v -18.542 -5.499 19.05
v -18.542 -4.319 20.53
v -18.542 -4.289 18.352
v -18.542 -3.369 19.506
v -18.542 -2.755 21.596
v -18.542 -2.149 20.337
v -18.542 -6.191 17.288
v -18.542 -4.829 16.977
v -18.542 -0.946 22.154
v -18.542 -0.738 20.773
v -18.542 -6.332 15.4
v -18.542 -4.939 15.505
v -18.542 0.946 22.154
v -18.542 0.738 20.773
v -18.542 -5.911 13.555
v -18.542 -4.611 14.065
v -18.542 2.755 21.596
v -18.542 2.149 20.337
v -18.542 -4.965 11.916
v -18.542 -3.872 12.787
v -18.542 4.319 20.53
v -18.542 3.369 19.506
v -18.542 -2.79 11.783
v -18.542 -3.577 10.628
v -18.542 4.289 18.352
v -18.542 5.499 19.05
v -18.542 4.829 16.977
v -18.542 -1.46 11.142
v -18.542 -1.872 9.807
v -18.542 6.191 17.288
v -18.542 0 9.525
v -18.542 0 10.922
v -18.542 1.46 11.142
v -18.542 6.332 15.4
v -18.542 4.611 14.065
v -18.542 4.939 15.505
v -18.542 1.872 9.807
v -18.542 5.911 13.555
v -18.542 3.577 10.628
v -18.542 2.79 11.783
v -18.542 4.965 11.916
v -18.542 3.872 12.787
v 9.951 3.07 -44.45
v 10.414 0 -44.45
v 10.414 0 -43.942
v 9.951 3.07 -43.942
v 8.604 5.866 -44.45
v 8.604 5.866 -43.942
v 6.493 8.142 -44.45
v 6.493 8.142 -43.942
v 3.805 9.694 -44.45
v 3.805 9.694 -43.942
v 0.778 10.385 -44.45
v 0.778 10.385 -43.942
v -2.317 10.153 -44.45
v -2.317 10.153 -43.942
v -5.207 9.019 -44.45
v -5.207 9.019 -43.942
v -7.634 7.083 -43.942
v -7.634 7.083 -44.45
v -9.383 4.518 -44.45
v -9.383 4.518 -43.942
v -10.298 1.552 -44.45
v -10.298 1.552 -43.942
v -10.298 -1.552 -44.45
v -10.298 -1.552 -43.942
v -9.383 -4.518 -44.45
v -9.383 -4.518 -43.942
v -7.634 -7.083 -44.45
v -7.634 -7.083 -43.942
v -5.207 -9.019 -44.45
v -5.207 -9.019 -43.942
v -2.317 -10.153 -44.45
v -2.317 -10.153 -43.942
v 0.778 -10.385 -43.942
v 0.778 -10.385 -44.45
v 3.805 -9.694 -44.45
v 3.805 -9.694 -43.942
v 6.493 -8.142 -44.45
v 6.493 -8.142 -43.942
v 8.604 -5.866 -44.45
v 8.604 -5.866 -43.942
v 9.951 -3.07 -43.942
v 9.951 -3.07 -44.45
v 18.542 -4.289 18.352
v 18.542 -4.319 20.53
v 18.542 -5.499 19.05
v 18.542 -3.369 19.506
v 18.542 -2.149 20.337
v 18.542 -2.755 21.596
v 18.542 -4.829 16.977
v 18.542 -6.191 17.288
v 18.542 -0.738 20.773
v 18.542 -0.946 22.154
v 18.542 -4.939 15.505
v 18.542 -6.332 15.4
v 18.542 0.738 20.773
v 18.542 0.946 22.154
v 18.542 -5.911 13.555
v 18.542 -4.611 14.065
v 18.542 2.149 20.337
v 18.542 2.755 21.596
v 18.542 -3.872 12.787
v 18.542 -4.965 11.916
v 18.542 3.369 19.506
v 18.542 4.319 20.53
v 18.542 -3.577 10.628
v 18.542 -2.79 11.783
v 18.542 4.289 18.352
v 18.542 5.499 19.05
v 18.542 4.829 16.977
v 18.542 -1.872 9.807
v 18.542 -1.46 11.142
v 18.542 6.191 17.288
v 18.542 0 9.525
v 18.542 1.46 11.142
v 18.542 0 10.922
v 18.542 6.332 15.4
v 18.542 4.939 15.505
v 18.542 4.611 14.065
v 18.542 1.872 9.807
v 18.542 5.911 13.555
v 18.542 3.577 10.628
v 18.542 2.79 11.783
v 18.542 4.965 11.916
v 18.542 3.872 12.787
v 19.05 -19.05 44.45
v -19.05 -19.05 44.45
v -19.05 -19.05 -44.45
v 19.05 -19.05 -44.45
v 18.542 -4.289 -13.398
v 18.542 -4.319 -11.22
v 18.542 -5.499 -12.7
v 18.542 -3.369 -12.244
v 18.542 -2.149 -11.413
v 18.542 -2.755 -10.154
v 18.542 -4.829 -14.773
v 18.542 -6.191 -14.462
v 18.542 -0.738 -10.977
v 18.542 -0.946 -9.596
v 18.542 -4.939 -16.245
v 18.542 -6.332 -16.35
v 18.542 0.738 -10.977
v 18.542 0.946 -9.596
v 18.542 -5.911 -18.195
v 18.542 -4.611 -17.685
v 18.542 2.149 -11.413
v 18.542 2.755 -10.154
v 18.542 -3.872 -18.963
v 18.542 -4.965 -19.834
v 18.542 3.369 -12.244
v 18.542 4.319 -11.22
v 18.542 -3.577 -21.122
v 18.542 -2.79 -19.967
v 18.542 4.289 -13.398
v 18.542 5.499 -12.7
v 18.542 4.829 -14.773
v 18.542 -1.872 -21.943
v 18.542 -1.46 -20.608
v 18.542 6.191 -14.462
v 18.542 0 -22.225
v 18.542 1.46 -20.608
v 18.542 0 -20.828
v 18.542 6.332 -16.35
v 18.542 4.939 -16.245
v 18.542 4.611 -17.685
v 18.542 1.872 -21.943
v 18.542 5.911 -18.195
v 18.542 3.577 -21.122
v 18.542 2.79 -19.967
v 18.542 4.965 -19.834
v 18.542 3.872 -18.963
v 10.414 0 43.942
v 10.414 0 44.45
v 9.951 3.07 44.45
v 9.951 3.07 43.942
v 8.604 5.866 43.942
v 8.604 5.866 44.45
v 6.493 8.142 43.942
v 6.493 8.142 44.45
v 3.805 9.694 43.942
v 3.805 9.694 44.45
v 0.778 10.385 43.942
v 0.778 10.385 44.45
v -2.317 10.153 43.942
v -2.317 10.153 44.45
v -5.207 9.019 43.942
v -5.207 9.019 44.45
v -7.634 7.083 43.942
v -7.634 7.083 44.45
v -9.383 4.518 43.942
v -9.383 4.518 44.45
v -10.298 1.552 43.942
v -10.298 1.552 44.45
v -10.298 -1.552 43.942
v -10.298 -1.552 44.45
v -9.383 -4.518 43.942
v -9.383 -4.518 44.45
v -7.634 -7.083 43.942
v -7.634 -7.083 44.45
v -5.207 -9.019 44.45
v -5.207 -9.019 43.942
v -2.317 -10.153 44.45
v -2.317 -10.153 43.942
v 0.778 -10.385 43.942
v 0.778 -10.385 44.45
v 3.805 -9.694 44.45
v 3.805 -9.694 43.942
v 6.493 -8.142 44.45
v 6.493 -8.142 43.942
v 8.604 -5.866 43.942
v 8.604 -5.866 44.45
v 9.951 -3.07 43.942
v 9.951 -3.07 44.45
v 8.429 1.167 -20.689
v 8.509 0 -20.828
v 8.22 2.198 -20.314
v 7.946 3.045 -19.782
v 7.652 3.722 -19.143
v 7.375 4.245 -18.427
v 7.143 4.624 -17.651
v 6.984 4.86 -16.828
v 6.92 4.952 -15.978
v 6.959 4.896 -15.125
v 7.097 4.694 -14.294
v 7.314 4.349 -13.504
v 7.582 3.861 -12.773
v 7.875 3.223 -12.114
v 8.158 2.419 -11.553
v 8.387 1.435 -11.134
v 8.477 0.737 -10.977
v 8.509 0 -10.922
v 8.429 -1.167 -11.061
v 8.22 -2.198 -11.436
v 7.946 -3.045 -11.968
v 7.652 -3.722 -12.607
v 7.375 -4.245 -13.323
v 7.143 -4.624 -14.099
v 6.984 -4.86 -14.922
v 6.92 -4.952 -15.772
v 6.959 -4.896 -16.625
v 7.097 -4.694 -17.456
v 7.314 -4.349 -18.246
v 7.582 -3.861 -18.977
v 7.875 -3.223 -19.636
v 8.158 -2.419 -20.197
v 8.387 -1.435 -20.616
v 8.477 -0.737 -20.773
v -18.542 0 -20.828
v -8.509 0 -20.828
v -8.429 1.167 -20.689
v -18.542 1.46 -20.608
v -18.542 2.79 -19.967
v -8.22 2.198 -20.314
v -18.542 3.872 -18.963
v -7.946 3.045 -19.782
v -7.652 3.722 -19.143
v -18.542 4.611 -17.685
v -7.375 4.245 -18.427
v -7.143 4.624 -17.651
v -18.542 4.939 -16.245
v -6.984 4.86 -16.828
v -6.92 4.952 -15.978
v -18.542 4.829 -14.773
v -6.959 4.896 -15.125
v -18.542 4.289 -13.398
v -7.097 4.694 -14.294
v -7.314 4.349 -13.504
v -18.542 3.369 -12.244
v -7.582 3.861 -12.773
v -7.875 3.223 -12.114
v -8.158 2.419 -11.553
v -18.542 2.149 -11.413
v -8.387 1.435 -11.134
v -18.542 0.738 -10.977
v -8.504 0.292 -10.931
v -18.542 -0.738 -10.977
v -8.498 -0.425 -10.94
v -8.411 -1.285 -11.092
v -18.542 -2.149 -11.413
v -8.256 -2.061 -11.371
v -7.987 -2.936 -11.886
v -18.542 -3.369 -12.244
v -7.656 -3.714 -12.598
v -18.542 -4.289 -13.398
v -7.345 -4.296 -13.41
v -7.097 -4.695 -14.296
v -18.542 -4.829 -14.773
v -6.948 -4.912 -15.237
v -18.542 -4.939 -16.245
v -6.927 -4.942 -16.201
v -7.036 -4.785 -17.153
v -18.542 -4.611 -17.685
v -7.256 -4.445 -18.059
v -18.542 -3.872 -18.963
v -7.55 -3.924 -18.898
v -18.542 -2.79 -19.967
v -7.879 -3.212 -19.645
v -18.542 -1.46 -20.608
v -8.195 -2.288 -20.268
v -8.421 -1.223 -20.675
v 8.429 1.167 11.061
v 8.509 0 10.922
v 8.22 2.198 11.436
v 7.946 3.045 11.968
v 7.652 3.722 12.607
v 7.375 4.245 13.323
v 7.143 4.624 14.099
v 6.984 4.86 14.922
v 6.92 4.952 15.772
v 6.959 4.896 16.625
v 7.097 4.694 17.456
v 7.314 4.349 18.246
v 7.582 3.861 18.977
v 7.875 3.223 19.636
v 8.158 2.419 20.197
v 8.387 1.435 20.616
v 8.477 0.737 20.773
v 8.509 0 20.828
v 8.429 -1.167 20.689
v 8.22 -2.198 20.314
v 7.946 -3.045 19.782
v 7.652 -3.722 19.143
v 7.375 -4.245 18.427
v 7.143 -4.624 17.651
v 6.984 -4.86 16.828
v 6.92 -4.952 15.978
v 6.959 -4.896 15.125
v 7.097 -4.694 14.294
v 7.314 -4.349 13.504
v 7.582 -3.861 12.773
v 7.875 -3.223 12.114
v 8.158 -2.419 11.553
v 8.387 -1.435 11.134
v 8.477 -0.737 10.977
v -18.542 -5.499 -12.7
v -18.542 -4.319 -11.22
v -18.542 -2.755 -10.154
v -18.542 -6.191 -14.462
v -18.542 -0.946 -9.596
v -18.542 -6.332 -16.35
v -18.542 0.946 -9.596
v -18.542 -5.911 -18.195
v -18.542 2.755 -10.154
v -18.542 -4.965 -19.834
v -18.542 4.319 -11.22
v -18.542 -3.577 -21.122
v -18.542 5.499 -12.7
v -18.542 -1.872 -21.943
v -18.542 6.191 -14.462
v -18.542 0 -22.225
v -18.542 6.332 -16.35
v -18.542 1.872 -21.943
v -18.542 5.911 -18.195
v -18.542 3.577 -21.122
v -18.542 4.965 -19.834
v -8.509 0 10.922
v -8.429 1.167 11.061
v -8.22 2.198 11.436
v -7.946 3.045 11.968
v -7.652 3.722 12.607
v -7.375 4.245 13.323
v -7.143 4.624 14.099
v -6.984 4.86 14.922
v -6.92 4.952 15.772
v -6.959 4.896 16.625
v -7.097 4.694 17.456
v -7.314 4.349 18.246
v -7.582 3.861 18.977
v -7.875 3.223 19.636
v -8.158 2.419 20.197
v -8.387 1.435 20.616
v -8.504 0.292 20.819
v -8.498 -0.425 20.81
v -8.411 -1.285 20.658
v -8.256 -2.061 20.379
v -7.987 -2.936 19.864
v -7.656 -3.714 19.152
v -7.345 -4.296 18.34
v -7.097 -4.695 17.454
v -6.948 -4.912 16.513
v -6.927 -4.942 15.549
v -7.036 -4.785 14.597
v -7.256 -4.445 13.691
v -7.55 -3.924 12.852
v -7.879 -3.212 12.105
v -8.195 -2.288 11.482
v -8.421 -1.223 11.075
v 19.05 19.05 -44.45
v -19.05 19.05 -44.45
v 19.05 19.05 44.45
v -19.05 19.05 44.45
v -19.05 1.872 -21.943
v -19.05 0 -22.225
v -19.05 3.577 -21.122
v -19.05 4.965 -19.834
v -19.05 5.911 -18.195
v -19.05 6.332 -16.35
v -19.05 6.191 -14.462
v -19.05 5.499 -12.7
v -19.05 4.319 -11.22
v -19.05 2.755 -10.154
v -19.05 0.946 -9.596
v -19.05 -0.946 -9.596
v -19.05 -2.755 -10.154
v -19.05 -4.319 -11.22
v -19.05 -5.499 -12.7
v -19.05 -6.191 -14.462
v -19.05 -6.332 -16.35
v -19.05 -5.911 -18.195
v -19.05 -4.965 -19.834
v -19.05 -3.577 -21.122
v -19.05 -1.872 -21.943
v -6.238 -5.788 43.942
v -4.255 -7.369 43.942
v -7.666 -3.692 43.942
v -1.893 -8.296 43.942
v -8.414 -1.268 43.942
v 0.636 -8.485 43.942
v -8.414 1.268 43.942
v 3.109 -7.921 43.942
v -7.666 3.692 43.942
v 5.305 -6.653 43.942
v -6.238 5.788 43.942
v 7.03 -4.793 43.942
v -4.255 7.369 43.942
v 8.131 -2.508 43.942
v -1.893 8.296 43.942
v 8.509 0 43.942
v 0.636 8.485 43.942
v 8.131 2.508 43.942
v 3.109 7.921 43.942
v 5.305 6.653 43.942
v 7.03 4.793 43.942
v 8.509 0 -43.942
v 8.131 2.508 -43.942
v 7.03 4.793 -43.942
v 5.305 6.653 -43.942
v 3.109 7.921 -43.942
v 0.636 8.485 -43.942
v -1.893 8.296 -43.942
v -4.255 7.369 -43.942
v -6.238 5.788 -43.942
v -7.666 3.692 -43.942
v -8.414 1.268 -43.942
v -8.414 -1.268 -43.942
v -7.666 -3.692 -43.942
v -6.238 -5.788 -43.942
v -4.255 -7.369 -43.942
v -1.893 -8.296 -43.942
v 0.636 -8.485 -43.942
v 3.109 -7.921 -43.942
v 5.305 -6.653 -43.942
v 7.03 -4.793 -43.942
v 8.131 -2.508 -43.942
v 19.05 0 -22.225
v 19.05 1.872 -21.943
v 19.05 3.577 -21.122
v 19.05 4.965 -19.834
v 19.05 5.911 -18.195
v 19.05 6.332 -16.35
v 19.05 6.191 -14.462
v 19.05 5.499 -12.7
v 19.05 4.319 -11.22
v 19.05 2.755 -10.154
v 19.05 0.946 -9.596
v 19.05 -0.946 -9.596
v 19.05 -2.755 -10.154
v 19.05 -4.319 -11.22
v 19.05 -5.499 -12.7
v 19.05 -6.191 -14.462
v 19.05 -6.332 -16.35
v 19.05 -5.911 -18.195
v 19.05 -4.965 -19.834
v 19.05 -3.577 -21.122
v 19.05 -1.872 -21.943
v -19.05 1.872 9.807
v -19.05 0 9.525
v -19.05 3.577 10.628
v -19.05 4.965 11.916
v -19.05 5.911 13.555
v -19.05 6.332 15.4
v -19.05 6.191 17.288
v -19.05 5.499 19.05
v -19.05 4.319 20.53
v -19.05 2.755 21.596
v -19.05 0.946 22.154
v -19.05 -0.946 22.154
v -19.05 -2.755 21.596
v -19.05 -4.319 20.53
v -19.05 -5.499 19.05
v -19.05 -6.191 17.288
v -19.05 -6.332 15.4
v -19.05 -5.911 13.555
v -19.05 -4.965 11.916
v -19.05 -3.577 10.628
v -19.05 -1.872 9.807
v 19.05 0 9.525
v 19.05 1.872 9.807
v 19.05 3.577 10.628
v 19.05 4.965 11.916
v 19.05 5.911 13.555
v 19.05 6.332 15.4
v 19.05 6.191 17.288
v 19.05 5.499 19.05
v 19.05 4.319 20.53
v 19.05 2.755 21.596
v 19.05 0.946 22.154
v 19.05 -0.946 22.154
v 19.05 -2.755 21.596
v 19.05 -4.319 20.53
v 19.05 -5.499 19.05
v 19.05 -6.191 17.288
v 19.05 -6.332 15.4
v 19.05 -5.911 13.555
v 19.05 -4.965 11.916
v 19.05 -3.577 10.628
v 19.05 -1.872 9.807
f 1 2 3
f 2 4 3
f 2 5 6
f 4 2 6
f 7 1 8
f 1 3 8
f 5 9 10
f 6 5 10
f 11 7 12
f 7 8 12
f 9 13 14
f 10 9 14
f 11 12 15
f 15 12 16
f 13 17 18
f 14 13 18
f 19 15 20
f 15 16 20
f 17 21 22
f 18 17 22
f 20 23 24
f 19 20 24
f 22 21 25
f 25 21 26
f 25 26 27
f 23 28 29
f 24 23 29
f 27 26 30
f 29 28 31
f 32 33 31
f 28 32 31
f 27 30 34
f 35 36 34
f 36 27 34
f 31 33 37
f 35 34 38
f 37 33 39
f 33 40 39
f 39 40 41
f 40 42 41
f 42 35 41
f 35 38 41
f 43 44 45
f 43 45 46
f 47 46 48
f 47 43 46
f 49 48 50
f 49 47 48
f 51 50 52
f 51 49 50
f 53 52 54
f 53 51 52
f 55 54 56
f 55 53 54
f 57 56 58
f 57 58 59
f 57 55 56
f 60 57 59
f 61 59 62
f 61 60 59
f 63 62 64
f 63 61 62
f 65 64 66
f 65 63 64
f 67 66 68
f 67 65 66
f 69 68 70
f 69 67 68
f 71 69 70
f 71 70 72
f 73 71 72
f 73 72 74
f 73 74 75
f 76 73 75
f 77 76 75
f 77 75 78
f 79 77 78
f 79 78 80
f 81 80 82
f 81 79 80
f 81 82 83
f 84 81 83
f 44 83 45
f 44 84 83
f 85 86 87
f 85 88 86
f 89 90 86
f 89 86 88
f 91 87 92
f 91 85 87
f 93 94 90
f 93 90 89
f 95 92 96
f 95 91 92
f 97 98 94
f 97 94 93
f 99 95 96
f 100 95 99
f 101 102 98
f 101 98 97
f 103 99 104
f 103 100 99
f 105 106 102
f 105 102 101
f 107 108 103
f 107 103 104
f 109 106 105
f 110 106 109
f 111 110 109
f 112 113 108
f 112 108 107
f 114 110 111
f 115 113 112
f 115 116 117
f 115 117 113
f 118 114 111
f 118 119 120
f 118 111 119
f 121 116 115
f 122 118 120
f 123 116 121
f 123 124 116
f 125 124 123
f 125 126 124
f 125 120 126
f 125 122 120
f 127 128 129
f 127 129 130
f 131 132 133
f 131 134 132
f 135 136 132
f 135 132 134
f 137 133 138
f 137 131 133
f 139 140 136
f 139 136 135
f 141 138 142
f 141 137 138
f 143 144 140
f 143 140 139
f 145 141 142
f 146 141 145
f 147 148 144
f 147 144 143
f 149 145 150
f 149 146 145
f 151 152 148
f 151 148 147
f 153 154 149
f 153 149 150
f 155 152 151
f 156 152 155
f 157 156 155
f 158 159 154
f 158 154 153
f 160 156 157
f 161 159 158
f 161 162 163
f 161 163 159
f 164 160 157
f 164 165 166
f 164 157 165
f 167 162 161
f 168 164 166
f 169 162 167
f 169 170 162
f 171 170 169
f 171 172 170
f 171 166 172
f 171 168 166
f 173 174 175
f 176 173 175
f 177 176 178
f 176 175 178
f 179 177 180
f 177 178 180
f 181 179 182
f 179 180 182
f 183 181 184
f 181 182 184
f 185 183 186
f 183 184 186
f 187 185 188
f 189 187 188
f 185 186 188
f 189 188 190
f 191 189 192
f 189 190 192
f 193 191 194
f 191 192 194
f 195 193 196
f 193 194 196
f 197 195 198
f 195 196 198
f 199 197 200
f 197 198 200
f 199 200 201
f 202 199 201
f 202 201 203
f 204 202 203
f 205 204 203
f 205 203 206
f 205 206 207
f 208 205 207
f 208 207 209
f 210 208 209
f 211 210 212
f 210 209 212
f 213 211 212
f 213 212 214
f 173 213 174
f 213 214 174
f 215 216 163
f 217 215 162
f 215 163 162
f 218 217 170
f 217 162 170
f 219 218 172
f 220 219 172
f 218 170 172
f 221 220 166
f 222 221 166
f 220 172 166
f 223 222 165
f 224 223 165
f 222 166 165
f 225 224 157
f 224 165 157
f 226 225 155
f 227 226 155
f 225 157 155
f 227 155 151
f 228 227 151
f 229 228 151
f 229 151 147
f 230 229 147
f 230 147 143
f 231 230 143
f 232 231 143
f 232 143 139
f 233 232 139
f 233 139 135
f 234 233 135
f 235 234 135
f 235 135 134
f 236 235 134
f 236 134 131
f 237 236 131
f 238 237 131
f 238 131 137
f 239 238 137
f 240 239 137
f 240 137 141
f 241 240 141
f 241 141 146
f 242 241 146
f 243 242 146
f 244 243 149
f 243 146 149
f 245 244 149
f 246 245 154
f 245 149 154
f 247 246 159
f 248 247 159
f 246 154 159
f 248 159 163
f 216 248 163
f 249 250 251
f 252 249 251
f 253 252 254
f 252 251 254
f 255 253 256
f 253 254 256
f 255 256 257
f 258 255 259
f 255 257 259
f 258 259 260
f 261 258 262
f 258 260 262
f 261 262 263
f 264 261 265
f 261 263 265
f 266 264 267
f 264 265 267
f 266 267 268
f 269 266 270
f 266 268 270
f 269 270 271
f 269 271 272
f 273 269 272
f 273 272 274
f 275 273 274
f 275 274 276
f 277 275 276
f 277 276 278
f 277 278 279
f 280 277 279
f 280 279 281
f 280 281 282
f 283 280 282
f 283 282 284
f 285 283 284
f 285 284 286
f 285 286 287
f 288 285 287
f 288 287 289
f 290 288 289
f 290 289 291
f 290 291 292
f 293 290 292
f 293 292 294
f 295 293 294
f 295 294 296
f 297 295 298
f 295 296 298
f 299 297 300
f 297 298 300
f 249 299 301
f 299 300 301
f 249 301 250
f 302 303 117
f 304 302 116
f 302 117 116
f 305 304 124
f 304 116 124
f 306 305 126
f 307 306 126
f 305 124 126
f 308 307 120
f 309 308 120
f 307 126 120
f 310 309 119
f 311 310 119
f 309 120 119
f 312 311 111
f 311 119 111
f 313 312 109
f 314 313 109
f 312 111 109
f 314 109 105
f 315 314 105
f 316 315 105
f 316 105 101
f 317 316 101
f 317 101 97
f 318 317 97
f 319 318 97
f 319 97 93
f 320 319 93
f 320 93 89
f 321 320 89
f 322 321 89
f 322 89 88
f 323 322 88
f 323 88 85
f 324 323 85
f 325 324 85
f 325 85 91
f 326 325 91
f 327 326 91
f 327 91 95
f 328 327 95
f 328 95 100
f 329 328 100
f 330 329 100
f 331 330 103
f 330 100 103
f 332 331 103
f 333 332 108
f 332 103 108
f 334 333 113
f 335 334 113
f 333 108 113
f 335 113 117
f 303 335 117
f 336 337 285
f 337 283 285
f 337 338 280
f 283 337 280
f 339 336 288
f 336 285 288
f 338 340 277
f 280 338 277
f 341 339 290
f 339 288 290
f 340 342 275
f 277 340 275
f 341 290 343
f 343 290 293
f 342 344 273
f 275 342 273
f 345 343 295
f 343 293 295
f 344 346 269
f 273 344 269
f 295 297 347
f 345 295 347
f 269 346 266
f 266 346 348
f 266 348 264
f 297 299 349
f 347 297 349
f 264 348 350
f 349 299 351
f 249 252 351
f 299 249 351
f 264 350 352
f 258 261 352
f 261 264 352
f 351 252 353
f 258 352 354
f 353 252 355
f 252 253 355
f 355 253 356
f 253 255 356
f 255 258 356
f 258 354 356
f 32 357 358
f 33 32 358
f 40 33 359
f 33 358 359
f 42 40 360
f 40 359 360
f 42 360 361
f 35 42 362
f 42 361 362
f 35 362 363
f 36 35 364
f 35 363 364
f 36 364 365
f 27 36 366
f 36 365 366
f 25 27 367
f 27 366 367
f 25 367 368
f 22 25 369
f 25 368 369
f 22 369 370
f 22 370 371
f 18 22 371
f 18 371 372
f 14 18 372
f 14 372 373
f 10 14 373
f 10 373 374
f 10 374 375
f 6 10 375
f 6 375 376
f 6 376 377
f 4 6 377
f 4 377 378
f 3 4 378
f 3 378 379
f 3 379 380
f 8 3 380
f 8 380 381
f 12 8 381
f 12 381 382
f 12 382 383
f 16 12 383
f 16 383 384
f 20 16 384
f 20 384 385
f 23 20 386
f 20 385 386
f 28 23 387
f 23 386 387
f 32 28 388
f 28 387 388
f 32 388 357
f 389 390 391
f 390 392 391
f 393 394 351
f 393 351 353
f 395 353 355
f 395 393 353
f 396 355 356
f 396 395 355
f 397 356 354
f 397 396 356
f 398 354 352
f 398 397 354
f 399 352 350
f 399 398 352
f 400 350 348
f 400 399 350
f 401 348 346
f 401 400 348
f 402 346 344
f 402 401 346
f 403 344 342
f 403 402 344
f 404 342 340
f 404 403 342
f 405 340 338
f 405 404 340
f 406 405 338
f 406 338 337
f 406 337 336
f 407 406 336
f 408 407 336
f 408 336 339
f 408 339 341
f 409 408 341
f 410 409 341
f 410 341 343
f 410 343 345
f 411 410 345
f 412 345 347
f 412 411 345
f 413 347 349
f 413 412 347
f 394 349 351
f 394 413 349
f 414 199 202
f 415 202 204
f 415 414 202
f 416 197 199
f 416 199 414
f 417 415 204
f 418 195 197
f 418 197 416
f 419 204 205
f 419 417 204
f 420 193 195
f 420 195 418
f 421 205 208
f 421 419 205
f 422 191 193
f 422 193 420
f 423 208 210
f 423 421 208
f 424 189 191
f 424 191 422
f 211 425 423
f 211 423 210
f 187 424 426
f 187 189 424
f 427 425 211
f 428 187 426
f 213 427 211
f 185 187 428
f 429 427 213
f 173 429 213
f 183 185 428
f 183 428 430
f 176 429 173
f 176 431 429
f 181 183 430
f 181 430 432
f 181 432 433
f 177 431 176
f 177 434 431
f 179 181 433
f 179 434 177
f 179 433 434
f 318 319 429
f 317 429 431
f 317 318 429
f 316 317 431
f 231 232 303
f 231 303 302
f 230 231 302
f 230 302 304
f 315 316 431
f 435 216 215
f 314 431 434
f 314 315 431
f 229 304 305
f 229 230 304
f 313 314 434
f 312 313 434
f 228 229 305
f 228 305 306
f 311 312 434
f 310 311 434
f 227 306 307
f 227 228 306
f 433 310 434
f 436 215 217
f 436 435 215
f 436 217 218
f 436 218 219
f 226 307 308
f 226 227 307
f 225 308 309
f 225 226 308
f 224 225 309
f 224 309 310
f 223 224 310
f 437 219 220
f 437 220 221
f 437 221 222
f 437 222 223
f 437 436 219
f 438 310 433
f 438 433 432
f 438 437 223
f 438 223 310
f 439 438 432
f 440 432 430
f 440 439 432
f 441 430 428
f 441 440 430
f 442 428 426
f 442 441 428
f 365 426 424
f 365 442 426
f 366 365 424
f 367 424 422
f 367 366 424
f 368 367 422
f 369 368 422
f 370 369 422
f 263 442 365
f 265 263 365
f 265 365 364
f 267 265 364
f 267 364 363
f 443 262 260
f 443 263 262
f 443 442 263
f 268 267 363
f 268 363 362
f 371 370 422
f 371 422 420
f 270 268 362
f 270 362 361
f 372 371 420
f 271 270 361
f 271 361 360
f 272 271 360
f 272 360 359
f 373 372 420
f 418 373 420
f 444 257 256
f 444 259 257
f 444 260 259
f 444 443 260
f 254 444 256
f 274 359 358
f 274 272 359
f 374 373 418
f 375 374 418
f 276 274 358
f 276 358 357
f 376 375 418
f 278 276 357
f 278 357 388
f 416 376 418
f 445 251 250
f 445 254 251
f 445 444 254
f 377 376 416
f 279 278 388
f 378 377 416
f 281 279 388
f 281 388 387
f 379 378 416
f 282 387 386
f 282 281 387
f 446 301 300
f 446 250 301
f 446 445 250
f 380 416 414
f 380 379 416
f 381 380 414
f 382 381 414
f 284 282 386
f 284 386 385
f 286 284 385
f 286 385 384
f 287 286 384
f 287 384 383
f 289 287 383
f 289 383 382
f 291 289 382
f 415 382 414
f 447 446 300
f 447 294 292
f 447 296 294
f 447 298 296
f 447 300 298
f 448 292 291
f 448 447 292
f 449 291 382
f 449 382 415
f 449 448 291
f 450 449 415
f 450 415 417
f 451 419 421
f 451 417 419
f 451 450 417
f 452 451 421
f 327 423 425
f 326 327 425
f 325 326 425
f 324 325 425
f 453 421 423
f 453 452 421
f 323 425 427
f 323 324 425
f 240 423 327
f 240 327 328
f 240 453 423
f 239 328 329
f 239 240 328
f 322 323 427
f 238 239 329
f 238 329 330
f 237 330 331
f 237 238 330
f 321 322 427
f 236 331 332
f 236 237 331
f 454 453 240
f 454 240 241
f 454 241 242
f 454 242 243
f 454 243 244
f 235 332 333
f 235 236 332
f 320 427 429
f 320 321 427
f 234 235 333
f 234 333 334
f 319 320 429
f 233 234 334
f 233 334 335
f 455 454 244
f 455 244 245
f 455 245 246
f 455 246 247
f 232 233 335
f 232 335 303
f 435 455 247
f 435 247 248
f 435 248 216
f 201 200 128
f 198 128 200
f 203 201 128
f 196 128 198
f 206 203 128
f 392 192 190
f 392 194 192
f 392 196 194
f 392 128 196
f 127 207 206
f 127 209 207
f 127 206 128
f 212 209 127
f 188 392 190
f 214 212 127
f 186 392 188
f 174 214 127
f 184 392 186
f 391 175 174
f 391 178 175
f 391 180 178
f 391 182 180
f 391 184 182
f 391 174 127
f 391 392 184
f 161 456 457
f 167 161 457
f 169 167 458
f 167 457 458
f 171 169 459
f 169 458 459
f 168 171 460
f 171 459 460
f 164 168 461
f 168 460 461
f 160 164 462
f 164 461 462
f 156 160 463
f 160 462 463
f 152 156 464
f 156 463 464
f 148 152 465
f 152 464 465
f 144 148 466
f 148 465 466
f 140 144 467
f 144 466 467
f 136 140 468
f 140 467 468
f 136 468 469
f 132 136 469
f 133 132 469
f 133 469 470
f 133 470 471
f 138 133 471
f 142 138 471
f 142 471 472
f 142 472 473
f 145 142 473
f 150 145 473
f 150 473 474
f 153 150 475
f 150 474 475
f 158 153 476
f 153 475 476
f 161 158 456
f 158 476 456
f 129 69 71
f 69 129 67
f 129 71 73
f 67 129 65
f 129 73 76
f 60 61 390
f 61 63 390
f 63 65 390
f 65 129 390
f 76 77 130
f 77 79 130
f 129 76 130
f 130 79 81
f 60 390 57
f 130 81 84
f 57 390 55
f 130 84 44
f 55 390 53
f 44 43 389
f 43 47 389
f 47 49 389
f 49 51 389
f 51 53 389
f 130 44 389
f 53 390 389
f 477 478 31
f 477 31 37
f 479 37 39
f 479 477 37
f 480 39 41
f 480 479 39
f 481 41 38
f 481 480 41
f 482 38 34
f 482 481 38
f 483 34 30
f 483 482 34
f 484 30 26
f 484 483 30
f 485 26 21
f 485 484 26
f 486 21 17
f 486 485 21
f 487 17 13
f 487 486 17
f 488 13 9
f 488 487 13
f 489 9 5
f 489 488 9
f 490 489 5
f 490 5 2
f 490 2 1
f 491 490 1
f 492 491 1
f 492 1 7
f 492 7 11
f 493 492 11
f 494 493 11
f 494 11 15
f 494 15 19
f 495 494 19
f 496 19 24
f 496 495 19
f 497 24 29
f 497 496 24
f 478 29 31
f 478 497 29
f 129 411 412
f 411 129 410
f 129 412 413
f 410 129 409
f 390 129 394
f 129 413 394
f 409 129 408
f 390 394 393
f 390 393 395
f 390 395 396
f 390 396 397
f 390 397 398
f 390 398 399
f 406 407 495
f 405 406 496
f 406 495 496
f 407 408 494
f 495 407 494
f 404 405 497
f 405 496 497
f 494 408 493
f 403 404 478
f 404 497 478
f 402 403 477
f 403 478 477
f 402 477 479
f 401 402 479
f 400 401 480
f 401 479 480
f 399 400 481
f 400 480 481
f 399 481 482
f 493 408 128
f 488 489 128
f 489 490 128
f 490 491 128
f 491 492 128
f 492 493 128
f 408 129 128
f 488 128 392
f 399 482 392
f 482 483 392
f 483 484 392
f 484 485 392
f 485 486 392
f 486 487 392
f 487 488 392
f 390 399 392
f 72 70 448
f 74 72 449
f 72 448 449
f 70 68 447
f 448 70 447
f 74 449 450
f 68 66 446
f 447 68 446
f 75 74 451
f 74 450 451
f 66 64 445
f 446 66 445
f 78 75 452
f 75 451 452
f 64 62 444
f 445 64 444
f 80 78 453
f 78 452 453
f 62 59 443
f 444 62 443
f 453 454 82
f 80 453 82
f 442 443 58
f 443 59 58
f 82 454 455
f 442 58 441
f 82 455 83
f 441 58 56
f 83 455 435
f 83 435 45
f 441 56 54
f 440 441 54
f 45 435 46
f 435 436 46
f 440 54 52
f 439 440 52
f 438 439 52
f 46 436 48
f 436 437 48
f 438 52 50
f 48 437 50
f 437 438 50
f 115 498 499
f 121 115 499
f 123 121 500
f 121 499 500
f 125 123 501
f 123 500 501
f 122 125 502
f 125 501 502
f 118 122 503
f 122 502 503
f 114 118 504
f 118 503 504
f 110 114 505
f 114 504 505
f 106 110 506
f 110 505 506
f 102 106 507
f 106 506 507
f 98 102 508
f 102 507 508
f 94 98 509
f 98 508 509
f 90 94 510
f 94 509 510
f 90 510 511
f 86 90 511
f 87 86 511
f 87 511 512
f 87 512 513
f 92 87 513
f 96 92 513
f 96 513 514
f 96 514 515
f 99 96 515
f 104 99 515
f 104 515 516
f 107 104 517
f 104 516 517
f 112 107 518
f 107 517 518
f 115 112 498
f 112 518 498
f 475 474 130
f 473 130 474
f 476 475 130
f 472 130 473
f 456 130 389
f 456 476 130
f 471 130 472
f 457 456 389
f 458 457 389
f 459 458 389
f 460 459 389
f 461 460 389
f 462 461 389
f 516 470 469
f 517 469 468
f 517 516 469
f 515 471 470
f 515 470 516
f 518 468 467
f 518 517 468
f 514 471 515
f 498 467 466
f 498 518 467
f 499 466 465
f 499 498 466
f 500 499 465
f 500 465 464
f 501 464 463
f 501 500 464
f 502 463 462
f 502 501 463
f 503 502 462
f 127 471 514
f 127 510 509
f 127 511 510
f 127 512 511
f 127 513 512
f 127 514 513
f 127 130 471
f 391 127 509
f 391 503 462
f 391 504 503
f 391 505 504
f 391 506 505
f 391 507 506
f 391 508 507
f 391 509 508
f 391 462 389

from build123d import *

# Parameters (mm, degrees)
SKETCH1_W           = 38.1
SKETCH1_H           = 38.1
SKETCH1_R           = 8.509
BOSS_EXTRUDE1_DEPTH = 44.45
SKETCH2_R           = 4.953
CUT_EXTRUDE1_DEPTH  = 39.1
CUT_EXTRUDE2_START  = 44.45
SKETCH13_R          = 10.414
CUT_EXTRUDE2_DEPTH  = 0.508
CUT_EXTRUDE3_START  = -44.45
SKETCH13_2_R        = 10.414
CUT_EXTRUDE3_DEPTH  = 0.508
CUT_EXTRUDE4_START  = 19.05
SKETCH14_R          = 6.35
CUT_EXTRUDE4_DEPTH  = 0.508
CUT_EXTRUDE5_START  = 19.05
SKETCH14_3_R        = 6.35
CUT_EXTRUDE5_DEPTH  = 0.508
CUT_EXTRUDE6_START  = -19.05
SKETCH14_4_R        = 6.35
CUT_EXTRUDE6_DEPTH  = 0.508


with BuildPart() as part:
    # Sketch1 → Boss-Extrude1 (new body, symmetric)
    with BuildSketch(Plane.XY):
        Rectangle(SKETCH1_W, SKETCH1_H)
        Circle(SKETCH1_R, mode=Mode.SUBTRACT)
    extrude(amount=BOSS_EXTRUDE1_DEPTH, both=True)

    # Sketch2 → Cut-Extrude1 (cut, through all)
    with BuildSketch(Plane(origin=(19.05, 0, 0), x_dir=(0, 0, -1), z_dir=(1, 0, 0))):
        with Locations((-15.875, 0)):
            Circle(SKETCH2_R)
        with Locations((15.875, 0)):
            Circle(SKETCH2_R)
    extrude(amount=-CUT_EXTRUDE1_DEPTH, mode=Mode.SUBTRACT)

    # Sketch13 → Cut-Extrude2 (cut)
    with BuildSketch(Plane.XY.offset(CUT_EXTRUDE2_START)):
        Circle(SKETCH13_R)
    extrude(amount=-CUT_EXTRUDE2_DEPTH, mode=Mode.SUBTRACT)

    # Sketch13<2> → Cut-Extrude3 (cut)
    with BuildSketch(Plane.XY.offset(CUT_EXTRUDE3_START)):
        Circle(SKETCH13_2_R)
    extrude(amount=CUT_EXTRUDE3_DEPTH, mode=Mode.SUBTRACT)

    # Sketch14 → Cut-Extrude4 (cut)
    with BuildSketch(Plane(origin=(0, 0, 0), x_dir=(0, 0, -1), z_dir=(1, 0, 0)).offset(CUT_EXTRUDE4_START)):
        with Locations((-15.875, 0)):
            Circle(SKETCH14_R)
    extrude(amount=-CUT_EXTRUDE4_DEPTH, mode=Mode.SUBTRACT)

    # Sketch14<3> → Cut-Extrude5 (cut)
    with BuildSketch(Plane(origin=(0, 0, 0), x_dir=(0, 0, -1), z_dir=(1, 0, 0)).offset(CUT_EXTRUDE5_START)):
        with Locations((-15.875, 0)):
            Circle(SKETCH14_3_R)
        with Locations((15.875, 0)):
            Circle(SKETCH14_3_R)
    extrude(amount=-CUT_EXTRUDE5_DEPTH, mode=Mode.SUBTRACT)

    # Sketch14<4> → Cut-Extrude6 (cut)
    with BuildSketch(Plane(origin=(0, 0, 0), x_dir=(0, 0, -1), z_dir=(1, 0, 0)).offset(CUT_EXTRUDE6_START)):
        with Locations((-15.875, 0)):
            Circle(SKETCH14_4_R)
        with Locations((15.875, 0)):
            Circle(SKETCH14_4_R)
    extrude(amount=CUT_EXTRUDE6_DEPTH, mode=Mode.SUBTRACT)


solid = part.part
